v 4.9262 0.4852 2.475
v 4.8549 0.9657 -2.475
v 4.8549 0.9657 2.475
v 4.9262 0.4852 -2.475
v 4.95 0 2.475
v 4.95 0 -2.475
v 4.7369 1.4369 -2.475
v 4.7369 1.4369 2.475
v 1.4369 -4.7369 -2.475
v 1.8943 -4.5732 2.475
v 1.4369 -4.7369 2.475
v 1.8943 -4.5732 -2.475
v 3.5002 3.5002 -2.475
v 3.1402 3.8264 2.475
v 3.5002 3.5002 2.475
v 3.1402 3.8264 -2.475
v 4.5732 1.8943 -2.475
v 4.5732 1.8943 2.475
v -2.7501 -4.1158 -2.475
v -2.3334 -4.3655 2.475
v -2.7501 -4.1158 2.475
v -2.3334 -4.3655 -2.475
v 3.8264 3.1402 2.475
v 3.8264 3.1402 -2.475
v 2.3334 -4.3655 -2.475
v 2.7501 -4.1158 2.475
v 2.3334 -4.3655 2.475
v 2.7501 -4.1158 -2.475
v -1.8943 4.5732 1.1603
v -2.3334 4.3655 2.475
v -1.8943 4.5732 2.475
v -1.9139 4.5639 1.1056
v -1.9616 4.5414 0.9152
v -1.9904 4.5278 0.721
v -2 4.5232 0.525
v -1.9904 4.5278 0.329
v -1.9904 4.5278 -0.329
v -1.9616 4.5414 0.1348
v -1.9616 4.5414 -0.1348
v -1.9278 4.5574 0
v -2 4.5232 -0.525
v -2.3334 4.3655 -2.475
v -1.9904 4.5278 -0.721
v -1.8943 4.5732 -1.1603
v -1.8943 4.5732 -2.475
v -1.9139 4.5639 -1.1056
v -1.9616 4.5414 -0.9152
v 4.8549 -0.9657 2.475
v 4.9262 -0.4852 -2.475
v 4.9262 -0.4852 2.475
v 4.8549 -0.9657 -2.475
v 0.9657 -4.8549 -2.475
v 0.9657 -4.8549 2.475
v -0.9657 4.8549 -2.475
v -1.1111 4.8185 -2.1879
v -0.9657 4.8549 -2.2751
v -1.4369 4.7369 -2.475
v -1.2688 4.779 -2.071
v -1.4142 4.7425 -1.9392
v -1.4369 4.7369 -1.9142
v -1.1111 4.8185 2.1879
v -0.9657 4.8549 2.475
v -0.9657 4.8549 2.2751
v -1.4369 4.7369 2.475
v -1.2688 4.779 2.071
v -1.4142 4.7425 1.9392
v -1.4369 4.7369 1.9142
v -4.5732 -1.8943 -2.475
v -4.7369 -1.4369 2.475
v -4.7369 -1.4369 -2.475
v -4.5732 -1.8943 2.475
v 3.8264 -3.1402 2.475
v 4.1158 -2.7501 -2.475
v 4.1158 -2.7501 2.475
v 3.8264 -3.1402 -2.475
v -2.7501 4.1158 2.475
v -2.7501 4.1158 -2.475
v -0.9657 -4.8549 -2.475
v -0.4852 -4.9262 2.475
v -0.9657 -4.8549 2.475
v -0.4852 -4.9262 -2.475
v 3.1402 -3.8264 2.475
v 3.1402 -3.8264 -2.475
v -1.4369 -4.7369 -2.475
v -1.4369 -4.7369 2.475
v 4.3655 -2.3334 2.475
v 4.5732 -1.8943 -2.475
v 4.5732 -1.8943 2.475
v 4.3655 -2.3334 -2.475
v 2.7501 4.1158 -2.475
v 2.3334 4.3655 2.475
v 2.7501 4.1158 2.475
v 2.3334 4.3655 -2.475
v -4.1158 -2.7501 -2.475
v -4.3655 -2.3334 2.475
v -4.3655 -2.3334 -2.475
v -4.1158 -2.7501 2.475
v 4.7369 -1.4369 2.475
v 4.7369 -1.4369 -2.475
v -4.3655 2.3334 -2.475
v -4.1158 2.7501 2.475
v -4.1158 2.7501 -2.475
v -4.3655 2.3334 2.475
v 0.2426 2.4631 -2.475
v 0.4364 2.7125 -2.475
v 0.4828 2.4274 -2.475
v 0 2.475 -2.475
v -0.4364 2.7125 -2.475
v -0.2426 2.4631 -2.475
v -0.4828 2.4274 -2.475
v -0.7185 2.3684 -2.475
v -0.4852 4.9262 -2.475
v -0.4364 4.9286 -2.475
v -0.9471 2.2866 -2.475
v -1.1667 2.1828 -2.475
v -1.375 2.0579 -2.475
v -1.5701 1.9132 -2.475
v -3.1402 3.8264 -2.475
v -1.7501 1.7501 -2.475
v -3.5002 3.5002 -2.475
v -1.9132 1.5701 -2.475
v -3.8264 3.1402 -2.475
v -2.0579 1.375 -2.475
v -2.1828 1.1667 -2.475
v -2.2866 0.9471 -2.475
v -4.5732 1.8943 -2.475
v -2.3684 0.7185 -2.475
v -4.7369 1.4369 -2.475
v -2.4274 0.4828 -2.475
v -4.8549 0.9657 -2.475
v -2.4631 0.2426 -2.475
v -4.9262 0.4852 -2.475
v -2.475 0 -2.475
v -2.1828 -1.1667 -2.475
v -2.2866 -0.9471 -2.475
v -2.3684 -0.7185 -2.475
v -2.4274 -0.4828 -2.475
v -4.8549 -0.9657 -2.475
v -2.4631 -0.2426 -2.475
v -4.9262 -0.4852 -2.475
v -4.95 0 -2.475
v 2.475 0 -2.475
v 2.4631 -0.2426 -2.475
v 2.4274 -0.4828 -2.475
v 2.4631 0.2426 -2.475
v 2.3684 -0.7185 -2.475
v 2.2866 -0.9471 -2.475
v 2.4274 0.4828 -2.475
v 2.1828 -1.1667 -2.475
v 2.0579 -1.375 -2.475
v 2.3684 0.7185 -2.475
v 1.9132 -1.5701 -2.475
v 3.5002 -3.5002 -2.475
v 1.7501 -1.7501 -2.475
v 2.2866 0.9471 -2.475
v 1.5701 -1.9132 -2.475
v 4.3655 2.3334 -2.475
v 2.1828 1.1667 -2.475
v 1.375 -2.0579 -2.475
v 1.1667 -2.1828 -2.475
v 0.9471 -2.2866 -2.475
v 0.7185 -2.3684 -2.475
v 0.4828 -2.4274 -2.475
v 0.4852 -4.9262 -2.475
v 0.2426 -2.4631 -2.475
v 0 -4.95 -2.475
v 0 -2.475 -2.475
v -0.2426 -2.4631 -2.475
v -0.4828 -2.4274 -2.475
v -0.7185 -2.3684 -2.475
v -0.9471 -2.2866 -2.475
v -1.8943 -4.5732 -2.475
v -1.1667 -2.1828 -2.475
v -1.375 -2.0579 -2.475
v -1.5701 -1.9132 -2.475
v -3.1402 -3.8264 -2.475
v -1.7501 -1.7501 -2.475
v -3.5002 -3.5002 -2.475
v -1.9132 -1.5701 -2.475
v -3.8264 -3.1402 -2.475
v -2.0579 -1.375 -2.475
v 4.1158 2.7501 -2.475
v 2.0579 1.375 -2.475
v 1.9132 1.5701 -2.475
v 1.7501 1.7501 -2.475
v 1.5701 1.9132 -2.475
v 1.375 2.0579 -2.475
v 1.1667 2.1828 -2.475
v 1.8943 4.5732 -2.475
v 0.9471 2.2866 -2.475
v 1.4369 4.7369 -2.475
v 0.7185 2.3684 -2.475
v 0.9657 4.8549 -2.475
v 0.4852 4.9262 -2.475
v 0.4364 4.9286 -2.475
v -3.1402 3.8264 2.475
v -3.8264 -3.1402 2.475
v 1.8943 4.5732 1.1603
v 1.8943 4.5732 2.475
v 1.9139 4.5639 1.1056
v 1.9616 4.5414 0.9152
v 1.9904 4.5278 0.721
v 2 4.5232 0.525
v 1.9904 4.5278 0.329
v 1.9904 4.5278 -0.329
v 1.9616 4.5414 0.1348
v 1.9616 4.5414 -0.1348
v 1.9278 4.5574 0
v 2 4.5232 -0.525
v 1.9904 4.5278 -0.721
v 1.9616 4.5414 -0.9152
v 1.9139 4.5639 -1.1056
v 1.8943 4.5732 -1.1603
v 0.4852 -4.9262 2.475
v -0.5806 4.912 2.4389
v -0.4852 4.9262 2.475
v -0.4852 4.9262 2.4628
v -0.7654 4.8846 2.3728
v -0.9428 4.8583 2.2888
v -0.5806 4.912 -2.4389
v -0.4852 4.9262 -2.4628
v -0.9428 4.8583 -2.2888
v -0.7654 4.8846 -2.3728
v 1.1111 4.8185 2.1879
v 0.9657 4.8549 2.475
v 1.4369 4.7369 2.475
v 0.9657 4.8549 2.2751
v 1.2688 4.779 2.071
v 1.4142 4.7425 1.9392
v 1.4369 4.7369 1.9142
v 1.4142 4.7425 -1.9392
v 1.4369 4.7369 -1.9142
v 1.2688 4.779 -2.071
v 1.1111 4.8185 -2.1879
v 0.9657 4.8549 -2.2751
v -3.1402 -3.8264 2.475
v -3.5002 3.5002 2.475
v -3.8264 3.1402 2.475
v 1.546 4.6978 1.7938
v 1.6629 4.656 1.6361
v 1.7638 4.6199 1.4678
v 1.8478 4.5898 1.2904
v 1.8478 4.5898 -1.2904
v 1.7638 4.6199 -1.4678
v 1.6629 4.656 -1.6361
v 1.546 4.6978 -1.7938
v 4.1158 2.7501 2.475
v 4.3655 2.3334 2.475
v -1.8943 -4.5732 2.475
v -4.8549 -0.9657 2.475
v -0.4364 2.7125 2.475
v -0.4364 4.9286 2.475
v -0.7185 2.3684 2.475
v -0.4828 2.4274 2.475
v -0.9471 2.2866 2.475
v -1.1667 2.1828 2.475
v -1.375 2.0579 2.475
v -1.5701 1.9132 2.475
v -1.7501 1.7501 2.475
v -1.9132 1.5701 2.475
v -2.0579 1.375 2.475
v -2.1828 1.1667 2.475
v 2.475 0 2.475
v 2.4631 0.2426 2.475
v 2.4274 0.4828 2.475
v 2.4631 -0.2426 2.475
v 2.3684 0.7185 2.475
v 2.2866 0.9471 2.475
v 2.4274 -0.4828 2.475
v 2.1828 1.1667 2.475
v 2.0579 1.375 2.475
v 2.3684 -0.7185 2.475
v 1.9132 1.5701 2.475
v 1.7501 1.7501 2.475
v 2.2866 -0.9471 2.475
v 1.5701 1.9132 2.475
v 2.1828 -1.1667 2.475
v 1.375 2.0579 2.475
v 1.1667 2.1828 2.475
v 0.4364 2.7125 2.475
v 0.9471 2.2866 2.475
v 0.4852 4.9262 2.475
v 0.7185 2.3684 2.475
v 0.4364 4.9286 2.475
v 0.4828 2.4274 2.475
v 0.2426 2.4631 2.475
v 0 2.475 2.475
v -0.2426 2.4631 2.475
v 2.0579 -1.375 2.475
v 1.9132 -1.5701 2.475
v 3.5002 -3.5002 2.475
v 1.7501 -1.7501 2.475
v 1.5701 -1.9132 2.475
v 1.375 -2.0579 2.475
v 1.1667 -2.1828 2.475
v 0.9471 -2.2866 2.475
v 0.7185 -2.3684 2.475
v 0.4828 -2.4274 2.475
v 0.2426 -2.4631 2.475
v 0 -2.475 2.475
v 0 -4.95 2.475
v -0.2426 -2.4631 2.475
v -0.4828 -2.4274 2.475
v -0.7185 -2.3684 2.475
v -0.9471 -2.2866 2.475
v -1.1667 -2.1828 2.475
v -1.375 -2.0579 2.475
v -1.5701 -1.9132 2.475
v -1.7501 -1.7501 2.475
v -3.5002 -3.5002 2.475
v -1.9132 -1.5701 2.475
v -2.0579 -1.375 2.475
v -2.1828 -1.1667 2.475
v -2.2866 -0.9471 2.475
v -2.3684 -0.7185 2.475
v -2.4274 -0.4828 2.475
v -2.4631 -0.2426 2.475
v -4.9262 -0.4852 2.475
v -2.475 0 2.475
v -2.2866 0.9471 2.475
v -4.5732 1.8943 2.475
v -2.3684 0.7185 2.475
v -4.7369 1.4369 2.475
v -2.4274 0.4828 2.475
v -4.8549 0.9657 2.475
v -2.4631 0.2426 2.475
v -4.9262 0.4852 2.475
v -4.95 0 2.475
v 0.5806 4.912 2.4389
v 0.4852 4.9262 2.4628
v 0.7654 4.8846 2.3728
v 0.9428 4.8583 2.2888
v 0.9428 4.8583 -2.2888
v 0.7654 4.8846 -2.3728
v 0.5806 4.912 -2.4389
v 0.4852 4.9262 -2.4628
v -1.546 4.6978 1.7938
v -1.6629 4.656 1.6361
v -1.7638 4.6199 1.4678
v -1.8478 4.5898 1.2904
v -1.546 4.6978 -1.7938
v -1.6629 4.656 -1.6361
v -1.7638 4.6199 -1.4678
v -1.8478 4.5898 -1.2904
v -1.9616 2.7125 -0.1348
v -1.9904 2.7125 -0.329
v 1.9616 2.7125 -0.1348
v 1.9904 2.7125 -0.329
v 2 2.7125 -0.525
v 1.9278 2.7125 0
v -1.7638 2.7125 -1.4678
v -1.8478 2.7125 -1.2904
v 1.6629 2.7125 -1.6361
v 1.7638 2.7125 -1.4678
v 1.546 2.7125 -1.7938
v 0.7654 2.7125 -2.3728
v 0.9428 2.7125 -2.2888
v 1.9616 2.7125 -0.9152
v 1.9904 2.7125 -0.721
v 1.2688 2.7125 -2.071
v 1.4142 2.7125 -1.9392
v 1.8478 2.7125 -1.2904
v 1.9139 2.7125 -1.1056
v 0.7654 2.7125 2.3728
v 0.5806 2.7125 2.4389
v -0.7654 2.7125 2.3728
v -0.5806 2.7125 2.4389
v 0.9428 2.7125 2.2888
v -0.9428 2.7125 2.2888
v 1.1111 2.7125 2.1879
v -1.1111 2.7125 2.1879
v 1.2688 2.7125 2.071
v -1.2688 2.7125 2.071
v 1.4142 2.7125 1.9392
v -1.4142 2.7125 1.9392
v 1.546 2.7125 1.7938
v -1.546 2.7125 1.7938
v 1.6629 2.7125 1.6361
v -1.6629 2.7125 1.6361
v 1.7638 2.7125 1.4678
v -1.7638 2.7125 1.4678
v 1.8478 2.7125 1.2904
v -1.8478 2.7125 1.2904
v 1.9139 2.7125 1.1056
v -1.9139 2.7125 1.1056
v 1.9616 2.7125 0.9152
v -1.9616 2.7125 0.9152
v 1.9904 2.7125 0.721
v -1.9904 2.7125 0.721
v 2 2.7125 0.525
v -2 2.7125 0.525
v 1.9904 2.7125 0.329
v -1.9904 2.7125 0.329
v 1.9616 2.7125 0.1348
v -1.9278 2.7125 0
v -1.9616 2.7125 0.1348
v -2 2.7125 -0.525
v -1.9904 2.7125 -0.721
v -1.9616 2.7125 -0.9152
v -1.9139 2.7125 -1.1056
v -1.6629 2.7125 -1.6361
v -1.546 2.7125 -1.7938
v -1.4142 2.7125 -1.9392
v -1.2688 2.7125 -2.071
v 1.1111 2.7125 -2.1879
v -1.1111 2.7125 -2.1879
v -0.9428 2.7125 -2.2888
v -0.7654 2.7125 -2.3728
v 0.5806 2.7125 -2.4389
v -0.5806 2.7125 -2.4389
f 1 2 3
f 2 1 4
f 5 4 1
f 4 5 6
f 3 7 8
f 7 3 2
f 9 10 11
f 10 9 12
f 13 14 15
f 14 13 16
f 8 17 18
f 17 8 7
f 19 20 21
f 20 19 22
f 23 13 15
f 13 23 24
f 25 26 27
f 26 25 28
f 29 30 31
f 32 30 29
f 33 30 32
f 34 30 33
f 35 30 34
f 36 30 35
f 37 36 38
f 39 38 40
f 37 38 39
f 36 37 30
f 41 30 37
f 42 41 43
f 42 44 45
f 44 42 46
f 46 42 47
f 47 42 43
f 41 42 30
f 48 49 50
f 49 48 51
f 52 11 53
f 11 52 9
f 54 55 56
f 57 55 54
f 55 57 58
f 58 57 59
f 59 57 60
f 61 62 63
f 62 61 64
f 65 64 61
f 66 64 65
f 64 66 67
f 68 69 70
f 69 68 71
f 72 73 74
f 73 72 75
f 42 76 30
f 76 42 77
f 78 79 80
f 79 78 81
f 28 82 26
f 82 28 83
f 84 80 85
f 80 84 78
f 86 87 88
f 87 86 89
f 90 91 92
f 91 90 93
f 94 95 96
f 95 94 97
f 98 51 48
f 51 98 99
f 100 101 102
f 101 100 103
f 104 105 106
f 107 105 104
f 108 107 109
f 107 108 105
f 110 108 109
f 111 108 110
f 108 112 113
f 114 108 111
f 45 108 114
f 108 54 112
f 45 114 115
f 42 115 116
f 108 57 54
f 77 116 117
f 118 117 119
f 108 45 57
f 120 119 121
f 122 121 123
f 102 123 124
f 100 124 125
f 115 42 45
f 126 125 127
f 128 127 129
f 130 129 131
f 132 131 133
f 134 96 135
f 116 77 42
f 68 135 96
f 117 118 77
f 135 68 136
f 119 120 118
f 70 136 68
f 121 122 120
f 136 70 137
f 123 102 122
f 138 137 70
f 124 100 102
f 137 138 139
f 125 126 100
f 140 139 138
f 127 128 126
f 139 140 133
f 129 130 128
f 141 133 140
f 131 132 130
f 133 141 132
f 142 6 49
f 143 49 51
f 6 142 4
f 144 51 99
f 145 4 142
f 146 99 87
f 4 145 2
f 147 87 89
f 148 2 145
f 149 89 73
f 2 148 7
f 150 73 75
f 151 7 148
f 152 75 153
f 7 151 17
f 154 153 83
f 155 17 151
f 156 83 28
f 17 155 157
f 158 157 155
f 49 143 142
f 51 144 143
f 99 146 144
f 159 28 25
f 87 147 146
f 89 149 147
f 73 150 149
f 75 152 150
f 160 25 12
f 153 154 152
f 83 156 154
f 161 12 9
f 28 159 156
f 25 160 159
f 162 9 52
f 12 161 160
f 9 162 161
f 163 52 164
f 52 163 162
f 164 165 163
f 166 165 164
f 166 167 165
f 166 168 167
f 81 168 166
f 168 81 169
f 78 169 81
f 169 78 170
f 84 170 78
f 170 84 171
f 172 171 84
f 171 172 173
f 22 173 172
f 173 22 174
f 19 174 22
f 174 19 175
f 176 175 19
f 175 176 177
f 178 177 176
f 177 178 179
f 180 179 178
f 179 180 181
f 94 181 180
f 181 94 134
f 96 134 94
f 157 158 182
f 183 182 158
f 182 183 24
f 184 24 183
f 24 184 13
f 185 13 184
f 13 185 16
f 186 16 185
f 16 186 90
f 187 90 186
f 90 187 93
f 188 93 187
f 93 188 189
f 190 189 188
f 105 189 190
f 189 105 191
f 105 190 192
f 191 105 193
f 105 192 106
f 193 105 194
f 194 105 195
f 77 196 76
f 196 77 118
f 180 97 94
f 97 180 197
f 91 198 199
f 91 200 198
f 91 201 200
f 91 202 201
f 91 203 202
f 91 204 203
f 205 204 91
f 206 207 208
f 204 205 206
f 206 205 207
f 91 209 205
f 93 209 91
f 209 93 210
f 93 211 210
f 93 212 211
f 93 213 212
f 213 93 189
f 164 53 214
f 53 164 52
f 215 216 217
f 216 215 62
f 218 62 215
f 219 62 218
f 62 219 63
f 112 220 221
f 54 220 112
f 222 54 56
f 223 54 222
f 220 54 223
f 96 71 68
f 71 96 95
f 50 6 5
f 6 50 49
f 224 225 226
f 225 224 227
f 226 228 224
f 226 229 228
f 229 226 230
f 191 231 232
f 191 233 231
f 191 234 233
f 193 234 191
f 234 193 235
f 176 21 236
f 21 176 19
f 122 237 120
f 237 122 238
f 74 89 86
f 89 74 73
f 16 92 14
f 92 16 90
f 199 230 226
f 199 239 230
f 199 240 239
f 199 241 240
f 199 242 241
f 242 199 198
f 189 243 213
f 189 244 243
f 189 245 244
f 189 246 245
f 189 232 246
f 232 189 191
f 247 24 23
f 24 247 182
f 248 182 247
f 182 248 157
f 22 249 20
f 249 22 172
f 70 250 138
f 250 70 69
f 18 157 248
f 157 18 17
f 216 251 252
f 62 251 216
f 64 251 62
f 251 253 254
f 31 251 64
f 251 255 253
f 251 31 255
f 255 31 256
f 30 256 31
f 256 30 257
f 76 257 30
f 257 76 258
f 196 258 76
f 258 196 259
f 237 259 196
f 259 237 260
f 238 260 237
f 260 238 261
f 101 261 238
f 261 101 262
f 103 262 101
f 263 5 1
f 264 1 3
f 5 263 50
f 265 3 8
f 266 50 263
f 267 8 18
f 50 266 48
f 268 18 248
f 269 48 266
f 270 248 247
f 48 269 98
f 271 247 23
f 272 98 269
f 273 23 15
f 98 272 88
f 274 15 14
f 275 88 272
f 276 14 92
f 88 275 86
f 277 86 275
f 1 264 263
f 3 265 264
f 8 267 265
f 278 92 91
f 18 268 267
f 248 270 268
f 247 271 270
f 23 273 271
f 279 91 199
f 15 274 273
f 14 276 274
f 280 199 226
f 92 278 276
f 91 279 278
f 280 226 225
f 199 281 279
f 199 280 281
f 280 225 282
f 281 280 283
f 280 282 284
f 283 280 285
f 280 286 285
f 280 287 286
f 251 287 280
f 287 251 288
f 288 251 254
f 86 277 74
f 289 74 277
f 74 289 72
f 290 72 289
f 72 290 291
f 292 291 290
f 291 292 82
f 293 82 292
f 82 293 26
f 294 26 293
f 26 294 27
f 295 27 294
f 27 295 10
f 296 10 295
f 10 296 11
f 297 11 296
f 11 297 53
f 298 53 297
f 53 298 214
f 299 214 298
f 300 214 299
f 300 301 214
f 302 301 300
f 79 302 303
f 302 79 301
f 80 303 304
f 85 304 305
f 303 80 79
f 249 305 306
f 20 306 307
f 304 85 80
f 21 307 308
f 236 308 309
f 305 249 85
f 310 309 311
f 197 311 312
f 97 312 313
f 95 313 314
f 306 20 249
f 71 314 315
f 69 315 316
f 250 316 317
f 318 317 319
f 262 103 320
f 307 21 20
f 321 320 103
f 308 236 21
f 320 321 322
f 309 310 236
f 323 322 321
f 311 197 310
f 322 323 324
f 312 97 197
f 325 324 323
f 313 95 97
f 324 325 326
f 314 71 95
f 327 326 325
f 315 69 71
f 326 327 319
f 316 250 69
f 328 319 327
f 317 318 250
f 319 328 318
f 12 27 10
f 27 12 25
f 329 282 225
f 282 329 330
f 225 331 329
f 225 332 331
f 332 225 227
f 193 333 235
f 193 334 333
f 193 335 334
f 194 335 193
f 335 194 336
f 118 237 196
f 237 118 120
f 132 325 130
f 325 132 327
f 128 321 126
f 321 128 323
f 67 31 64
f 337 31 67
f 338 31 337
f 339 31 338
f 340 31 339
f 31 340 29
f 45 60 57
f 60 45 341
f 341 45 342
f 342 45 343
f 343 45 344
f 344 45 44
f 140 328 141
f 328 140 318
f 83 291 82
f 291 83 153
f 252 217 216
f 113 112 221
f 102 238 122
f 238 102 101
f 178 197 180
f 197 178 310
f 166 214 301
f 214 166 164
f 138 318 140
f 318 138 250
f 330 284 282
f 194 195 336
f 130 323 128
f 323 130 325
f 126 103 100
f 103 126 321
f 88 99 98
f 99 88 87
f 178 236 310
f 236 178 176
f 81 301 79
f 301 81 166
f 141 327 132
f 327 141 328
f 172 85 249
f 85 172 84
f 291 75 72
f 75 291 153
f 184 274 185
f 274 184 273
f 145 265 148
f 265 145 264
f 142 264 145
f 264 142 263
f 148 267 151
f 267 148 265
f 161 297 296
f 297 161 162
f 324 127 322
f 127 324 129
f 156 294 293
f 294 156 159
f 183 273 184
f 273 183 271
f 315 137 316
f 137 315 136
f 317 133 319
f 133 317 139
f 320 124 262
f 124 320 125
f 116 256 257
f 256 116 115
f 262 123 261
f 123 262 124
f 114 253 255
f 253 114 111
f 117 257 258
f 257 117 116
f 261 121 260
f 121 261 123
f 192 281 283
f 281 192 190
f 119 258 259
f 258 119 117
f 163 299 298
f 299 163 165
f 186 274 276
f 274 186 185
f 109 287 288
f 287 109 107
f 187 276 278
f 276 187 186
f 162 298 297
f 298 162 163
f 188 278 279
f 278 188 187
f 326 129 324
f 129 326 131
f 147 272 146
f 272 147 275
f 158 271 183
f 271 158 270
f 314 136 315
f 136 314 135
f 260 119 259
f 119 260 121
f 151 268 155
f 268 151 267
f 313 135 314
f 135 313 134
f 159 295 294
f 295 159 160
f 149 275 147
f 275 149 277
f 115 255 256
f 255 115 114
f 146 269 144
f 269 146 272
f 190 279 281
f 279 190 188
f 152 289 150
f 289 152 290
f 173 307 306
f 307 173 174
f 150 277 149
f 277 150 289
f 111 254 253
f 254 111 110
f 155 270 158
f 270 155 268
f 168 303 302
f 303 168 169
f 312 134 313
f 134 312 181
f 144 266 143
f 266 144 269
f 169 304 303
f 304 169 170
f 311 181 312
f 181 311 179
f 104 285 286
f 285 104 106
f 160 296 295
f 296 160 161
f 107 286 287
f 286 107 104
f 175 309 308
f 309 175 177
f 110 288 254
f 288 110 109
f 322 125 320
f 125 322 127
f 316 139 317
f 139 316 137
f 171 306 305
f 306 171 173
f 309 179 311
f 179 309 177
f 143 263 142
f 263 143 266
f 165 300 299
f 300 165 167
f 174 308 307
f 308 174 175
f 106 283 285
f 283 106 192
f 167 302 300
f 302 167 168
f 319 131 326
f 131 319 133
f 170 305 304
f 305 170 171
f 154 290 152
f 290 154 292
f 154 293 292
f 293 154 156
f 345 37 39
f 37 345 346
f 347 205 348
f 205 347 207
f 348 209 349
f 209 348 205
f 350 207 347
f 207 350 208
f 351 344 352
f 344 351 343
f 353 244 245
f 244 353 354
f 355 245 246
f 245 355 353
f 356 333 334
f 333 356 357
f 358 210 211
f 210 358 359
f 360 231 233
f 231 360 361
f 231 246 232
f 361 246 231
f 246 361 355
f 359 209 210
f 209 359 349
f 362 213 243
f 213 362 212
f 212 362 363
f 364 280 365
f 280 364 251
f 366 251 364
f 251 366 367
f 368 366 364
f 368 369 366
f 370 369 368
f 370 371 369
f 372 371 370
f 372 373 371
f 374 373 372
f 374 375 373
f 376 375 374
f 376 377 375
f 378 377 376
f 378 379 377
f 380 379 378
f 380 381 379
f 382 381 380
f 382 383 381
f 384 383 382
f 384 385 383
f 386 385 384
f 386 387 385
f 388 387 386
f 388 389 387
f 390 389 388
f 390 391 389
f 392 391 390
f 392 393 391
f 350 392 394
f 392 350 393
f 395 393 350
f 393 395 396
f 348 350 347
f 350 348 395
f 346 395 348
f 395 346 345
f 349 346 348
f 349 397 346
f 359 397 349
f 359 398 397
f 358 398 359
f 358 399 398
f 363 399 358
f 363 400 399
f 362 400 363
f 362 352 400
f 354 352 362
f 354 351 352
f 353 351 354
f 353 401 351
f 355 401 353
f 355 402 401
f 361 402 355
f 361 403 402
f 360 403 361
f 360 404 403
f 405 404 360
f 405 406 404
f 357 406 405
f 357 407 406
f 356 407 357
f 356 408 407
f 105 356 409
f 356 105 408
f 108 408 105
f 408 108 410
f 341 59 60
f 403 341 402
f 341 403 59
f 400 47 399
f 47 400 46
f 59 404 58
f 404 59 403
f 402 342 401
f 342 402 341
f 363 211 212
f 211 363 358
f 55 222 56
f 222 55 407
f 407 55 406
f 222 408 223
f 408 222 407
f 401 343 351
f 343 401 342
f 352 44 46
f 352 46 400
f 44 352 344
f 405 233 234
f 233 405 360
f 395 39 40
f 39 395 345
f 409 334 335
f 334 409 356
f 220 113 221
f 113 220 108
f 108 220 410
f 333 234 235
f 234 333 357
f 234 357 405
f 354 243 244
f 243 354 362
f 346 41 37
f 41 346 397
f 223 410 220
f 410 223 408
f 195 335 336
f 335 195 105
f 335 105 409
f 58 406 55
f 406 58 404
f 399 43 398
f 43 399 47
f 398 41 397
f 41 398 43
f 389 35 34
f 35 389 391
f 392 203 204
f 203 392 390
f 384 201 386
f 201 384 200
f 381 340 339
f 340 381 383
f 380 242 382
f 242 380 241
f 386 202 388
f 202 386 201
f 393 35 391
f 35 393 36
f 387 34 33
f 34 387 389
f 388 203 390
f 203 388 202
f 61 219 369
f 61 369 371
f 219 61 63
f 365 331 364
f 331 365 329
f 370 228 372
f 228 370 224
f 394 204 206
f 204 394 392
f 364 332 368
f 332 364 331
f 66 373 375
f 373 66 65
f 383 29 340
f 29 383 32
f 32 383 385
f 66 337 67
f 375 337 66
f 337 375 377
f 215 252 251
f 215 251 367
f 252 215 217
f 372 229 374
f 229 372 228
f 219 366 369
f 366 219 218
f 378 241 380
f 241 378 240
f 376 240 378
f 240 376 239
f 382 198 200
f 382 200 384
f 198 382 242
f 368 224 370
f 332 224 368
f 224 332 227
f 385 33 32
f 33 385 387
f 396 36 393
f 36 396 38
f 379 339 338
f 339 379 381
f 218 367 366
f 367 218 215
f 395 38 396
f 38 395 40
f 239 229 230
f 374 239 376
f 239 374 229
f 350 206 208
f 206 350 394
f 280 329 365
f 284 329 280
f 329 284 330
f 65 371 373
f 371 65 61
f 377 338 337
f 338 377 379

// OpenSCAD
// COBRA Vertebra - C5 V4
// Height: 4.95mm, OD: 9.9mm

$fn = 64;

difference() {
    // Outer cylinder
    cylinder(h=4.95, d=9.9, center=true);
    
    // Inner channel
    cylinder(h=6.95, d=4.95, center=true);

    // Pivot holes
    translate([0, 4.95, -0.5249999999999999])
    rotate([90, 0, 0])
    cylinder(h=4.475, d=4, center=true);
    
    translate([0, 4.95, 0.5249999999999999])
    rotate([90, 0, 0])
    cylinder(h=4.475, d=4, center=true);
}
